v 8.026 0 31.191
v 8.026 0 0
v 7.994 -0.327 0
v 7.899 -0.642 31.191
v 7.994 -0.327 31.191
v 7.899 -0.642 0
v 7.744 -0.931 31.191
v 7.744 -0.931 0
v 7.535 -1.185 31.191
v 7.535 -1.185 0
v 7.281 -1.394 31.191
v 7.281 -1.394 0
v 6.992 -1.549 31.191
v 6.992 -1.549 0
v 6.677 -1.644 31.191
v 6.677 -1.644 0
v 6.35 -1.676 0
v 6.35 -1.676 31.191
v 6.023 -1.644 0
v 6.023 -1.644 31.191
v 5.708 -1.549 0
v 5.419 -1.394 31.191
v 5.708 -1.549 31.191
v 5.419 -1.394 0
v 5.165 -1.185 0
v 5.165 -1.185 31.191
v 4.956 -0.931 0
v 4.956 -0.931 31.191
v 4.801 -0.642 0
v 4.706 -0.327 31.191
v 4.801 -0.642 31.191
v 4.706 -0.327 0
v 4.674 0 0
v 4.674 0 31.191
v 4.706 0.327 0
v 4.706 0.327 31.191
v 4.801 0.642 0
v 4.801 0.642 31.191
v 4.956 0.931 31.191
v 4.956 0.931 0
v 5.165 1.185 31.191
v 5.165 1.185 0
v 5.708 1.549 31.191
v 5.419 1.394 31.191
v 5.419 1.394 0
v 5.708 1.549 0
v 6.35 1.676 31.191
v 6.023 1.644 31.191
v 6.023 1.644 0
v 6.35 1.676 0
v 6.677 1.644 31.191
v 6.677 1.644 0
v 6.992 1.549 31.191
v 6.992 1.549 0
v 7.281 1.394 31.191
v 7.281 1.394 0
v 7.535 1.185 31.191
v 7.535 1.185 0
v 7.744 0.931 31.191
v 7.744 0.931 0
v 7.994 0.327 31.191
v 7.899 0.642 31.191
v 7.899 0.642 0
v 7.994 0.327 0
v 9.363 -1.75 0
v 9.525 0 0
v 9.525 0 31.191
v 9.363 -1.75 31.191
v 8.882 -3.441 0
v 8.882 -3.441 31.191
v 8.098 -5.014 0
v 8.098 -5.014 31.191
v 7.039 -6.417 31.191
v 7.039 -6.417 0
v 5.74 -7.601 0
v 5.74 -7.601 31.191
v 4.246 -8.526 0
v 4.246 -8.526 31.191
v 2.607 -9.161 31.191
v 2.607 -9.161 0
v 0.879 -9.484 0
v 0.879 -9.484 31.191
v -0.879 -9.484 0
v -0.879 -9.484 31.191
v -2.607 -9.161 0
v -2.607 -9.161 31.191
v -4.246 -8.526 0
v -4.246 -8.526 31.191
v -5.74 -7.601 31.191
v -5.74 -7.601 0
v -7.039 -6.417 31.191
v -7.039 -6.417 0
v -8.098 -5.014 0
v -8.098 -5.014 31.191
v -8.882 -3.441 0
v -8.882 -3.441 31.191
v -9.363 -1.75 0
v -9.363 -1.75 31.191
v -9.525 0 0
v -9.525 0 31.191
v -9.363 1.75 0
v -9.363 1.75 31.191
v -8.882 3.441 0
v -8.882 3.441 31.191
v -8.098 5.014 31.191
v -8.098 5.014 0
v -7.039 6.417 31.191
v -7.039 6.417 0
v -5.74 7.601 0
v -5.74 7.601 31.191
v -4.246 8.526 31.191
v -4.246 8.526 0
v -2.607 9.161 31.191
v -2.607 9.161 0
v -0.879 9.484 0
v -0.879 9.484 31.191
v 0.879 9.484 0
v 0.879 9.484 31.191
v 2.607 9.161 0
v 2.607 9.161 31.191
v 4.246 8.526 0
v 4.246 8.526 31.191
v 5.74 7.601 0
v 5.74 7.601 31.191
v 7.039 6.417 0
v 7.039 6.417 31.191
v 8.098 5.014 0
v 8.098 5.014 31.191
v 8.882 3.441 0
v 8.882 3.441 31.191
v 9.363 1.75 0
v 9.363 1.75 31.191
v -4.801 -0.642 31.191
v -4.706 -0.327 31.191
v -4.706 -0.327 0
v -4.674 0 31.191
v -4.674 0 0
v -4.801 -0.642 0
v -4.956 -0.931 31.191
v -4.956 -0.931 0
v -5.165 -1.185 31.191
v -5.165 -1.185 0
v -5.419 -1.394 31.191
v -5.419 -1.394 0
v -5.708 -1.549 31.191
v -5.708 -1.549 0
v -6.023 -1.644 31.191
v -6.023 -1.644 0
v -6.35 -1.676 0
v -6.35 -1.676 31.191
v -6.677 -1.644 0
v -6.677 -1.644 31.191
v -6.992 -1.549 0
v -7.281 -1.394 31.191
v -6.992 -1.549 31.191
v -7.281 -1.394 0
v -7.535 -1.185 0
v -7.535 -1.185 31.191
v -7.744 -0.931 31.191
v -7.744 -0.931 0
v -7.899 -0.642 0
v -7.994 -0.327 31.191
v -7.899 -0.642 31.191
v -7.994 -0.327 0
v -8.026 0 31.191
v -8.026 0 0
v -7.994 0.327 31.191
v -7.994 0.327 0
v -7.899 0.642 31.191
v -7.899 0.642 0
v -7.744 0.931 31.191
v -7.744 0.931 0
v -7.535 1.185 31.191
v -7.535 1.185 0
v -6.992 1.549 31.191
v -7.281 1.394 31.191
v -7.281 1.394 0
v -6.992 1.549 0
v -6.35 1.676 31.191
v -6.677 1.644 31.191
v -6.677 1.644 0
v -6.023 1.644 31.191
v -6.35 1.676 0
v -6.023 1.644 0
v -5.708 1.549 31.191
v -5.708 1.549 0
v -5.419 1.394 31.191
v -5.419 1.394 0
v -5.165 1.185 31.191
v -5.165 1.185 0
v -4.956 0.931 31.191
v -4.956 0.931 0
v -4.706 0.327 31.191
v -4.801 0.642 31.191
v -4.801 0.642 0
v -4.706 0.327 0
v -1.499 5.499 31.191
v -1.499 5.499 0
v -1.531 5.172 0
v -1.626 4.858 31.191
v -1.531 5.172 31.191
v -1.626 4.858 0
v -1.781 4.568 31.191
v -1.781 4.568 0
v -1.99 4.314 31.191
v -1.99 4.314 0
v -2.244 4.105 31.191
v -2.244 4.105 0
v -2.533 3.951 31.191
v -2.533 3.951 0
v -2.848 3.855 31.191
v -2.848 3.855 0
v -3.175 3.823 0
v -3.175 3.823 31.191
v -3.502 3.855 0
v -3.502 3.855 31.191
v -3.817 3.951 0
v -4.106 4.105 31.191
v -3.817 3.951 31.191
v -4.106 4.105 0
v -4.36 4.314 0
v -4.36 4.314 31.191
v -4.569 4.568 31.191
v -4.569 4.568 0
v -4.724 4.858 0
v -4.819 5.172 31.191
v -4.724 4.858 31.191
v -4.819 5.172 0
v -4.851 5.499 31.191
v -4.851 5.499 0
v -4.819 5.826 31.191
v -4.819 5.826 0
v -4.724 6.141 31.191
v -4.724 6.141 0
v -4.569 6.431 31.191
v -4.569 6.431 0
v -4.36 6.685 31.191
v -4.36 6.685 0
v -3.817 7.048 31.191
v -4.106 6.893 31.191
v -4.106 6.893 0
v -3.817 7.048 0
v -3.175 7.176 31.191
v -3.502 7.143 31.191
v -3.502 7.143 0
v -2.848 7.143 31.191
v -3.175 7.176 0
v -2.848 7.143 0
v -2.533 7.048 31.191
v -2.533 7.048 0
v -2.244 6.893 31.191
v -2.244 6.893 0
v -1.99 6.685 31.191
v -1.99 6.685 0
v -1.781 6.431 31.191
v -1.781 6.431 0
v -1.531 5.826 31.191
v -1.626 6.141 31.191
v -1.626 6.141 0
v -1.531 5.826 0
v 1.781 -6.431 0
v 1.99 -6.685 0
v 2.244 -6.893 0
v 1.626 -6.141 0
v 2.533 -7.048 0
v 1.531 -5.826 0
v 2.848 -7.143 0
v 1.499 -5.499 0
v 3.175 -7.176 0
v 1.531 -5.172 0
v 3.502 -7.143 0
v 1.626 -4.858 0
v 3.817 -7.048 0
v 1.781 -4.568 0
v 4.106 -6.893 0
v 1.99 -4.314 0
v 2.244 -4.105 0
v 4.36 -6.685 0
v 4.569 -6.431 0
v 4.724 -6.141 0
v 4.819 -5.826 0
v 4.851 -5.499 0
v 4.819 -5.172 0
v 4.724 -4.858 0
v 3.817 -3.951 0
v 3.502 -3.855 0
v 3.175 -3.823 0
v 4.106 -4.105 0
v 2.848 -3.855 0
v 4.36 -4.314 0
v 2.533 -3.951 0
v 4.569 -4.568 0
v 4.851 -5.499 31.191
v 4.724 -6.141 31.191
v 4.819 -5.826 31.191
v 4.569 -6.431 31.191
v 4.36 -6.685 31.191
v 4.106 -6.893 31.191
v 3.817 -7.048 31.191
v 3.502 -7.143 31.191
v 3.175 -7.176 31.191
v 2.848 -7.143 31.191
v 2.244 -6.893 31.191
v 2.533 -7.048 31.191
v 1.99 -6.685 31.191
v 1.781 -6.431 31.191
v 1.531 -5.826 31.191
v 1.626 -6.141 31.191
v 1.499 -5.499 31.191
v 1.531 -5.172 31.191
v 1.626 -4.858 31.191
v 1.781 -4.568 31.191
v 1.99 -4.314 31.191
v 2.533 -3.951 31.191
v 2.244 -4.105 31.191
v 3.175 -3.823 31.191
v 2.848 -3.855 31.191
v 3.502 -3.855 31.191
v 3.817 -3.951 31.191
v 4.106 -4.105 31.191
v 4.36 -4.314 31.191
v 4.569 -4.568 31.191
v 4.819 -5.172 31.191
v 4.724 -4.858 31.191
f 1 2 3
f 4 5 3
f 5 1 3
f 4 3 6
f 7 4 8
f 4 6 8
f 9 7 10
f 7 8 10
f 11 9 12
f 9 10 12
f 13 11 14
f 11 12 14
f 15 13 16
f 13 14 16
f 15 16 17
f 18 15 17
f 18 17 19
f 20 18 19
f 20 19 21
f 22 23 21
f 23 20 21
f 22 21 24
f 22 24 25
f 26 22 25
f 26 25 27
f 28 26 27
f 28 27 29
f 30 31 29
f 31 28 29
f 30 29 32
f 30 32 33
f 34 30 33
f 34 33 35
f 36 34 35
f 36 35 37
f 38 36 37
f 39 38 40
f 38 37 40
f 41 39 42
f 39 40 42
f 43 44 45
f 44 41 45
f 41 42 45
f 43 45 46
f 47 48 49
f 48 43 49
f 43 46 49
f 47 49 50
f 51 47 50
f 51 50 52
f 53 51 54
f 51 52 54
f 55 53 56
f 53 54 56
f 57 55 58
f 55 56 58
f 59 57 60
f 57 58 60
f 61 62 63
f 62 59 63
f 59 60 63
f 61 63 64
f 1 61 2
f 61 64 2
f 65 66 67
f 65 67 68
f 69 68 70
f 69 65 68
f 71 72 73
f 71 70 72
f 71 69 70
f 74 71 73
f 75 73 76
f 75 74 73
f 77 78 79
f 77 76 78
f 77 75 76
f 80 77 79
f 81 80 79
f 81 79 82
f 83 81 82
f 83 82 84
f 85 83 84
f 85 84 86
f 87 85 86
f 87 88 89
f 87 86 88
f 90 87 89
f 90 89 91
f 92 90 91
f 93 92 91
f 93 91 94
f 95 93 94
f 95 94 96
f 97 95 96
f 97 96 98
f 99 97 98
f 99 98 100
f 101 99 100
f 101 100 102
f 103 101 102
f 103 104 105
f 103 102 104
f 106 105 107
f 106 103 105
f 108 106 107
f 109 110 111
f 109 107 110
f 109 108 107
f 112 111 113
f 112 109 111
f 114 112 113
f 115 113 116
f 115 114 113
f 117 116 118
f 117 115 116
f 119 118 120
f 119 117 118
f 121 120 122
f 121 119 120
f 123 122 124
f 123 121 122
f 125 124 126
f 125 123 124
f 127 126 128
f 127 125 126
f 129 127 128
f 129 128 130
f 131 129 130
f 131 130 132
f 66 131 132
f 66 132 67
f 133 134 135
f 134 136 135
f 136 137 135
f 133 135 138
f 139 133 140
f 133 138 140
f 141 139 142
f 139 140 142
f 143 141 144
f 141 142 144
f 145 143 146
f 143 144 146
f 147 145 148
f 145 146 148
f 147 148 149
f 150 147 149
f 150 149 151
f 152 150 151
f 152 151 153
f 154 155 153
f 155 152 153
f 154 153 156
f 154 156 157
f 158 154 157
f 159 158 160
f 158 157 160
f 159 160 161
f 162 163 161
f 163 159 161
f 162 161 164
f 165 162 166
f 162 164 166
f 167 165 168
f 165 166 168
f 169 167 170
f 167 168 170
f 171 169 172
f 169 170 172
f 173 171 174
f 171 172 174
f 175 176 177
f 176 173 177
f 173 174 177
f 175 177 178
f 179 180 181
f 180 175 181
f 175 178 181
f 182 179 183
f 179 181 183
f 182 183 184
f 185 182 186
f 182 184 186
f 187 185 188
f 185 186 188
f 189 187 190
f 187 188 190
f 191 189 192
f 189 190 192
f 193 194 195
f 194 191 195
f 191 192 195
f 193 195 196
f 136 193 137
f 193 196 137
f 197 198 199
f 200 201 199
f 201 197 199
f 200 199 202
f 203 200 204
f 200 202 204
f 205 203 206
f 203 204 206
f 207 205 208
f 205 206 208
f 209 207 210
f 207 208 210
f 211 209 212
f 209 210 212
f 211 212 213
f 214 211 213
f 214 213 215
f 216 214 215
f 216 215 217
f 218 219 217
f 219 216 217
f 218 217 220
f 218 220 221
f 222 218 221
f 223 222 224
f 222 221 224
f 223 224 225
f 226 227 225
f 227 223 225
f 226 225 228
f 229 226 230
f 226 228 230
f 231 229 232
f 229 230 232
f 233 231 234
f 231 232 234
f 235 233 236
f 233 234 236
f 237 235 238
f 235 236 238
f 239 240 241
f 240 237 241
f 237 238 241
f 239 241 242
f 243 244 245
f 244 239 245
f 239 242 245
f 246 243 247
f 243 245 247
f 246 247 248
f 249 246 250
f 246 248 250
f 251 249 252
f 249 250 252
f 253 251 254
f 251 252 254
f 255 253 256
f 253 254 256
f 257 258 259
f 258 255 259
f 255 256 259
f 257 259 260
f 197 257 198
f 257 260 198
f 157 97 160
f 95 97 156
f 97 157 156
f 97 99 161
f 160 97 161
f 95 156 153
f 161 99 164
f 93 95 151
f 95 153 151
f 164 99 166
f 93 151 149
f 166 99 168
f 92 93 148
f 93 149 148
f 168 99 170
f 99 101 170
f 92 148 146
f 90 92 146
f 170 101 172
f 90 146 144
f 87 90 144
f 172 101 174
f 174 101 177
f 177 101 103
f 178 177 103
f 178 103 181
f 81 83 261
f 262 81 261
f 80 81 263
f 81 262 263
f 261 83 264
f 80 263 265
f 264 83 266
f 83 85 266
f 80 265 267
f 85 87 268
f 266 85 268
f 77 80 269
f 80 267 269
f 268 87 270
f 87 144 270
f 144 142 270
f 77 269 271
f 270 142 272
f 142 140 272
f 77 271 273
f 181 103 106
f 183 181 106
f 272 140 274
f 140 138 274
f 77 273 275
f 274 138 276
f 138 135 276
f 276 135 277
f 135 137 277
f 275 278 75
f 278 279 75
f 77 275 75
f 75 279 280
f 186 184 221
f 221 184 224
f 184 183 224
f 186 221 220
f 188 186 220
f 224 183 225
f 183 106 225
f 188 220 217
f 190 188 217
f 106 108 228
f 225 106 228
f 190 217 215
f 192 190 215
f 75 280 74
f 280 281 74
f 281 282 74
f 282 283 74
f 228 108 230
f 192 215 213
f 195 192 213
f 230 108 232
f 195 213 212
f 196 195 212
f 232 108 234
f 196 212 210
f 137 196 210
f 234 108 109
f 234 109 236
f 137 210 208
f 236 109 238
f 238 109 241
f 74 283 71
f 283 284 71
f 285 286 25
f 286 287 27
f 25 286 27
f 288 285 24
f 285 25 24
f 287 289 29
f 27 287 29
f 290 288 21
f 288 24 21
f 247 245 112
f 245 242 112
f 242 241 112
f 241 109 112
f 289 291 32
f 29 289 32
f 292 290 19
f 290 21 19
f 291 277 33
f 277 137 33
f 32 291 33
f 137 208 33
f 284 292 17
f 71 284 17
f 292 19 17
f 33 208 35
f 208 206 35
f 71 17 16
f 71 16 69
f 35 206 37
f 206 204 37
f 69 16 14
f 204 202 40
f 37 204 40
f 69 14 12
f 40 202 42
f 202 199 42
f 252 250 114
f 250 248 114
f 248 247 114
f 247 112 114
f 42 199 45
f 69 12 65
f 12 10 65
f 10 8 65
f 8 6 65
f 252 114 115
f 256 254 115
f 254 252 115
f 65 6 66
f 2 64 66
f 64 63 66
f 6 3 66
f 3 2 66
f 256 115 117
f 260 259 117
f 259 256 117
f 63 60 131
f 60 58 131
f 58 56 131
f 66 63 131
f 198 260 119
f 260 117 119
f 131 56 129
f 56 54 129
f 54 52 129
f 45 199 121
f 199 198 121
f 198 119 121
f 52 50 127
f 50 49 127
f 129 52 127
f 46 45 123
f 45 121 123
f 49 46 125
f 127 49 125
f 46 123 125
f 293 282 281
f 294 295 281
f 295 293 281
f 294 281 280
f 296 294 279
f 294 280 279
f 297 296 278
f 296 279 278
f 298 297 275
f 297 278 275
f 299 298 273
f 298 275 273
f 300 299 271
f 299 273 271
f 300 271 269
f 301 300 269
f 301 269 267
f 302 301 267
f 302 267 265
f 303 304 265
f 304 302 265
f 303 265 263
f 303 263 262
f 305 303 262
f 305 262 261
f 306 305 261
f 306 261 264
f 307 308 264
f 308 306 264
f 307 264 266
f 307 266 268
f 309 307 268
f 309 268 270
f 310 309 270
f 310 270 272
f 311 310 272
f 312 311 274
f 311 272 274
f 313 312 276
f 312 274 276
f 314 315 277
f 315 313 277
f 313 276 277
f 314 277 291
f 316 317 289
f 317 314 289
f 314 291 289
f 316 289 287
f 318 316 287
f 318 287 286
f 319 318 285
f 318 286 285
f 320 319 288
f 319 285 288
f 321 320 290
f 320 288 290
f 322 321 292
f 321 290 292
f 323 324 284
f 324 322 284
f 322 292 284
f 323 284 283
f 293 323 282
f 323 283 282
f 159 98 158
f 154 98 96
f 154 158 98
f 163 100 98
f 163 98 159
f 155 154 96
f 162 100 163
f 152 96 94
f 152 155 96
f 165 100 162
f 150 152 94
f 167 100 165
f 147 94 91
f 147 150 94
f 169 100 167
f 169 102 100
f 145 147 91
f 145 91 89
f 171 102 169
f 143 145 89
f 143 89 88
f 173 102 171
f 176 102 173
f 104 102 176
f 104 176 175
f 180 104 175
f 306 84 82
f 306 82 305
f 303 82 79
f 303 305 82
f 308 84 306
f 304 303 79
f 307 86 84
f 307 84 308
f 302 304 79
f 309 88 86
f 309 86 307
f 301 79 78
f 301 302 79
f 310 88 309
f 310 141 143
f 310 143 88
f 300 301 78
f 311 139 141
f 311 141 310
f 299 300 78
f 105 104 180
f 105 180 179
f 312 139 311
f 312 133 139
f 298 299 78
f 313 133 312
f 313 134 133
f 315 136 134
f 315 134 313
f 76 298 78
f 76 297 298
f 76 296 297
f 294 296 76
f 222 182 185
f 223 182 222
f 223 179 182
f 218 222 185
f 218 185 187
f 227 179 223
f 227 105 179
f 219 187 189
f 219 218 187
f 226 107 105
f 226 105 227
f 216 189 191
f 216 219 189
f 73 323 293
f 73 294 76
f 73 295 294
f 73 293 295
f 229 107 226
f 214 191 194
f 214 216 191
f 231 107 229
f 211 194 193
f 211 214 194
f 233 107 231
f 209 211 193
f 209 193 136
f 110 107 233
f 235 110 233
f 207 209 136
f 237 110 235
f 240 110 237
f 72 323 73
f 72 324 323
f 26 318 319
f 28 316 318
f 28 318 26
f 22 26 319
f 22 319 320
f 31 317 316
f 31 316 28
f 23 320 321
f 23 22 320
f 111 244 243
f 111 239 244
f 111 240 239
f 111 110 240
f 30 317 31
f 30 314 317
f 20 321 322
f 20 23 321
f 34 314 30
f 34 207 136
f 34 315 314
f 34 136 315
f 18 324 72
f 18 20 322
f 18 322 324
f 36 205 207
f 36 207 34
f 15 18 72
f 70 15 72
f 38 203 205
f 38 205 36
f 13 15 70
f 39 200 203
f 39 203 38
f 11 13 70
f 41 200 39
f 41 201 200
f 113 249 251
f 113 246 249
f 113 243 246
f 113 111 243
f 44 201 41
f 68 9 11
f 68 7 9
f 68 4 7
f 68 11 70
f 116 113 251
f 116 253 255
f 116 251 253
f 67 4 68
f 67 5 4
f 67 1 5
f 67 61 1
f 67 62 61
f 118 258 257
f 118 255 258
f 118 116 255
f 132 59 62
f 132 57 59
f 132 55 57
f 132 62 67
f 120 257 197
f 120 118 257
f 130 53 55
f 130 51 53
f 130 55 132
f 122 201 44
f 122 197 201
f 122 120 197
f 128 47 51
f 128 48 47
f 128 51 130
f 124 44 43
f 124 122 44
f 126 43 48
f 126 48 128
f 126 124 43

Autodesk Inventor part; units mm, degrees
ref_plane "YZ Plane" through (0, 0, 0) normal (1, 0, 0) x (0, 1, 0)
ref_plane "XZ Plane" through (0, 0, 0) normal (0, 1, 0) x (-1, 0, 0)
ref_plane "XY Plane" through (0, 0, 0) normal (0, 0, 1) x (1, 0, 0)
sketch "Sketch1" plane through (0, 0, 0) normal (0, 0, 1) x (1, 0, 0)
  circle A0 centre (3.175, -5.4993) radius 1.6764
  circle A1 centre (-3.175, 5.4993) radius 1.6764
  circle A2 centre (0, 0) radius 9.525
  circle A3 centre (-6.35, 0) radius 1.6764
  circle A4 centre (6.35, 0) radius 1.6764
  circle A5 centre (-6.35, 0) radius 1.6764
  circle A6 centre (6.35, 0) radius 1.6764
  point P0 (-9.525, 0)
  point P1 (9.525, 0)
  dimension "d69" = 3.3528
  dimension "d70" = 3.3528
  dimension "d75" = 3.3528
  dimension "d76" = 3.3528
  dimension "d77" = 3.3528
  dimension "d78" = 3.3528
extrude "Extrusion14" add sketch "Sketch1" along normal blind 31.1912
properties part number "Crankshaft"
